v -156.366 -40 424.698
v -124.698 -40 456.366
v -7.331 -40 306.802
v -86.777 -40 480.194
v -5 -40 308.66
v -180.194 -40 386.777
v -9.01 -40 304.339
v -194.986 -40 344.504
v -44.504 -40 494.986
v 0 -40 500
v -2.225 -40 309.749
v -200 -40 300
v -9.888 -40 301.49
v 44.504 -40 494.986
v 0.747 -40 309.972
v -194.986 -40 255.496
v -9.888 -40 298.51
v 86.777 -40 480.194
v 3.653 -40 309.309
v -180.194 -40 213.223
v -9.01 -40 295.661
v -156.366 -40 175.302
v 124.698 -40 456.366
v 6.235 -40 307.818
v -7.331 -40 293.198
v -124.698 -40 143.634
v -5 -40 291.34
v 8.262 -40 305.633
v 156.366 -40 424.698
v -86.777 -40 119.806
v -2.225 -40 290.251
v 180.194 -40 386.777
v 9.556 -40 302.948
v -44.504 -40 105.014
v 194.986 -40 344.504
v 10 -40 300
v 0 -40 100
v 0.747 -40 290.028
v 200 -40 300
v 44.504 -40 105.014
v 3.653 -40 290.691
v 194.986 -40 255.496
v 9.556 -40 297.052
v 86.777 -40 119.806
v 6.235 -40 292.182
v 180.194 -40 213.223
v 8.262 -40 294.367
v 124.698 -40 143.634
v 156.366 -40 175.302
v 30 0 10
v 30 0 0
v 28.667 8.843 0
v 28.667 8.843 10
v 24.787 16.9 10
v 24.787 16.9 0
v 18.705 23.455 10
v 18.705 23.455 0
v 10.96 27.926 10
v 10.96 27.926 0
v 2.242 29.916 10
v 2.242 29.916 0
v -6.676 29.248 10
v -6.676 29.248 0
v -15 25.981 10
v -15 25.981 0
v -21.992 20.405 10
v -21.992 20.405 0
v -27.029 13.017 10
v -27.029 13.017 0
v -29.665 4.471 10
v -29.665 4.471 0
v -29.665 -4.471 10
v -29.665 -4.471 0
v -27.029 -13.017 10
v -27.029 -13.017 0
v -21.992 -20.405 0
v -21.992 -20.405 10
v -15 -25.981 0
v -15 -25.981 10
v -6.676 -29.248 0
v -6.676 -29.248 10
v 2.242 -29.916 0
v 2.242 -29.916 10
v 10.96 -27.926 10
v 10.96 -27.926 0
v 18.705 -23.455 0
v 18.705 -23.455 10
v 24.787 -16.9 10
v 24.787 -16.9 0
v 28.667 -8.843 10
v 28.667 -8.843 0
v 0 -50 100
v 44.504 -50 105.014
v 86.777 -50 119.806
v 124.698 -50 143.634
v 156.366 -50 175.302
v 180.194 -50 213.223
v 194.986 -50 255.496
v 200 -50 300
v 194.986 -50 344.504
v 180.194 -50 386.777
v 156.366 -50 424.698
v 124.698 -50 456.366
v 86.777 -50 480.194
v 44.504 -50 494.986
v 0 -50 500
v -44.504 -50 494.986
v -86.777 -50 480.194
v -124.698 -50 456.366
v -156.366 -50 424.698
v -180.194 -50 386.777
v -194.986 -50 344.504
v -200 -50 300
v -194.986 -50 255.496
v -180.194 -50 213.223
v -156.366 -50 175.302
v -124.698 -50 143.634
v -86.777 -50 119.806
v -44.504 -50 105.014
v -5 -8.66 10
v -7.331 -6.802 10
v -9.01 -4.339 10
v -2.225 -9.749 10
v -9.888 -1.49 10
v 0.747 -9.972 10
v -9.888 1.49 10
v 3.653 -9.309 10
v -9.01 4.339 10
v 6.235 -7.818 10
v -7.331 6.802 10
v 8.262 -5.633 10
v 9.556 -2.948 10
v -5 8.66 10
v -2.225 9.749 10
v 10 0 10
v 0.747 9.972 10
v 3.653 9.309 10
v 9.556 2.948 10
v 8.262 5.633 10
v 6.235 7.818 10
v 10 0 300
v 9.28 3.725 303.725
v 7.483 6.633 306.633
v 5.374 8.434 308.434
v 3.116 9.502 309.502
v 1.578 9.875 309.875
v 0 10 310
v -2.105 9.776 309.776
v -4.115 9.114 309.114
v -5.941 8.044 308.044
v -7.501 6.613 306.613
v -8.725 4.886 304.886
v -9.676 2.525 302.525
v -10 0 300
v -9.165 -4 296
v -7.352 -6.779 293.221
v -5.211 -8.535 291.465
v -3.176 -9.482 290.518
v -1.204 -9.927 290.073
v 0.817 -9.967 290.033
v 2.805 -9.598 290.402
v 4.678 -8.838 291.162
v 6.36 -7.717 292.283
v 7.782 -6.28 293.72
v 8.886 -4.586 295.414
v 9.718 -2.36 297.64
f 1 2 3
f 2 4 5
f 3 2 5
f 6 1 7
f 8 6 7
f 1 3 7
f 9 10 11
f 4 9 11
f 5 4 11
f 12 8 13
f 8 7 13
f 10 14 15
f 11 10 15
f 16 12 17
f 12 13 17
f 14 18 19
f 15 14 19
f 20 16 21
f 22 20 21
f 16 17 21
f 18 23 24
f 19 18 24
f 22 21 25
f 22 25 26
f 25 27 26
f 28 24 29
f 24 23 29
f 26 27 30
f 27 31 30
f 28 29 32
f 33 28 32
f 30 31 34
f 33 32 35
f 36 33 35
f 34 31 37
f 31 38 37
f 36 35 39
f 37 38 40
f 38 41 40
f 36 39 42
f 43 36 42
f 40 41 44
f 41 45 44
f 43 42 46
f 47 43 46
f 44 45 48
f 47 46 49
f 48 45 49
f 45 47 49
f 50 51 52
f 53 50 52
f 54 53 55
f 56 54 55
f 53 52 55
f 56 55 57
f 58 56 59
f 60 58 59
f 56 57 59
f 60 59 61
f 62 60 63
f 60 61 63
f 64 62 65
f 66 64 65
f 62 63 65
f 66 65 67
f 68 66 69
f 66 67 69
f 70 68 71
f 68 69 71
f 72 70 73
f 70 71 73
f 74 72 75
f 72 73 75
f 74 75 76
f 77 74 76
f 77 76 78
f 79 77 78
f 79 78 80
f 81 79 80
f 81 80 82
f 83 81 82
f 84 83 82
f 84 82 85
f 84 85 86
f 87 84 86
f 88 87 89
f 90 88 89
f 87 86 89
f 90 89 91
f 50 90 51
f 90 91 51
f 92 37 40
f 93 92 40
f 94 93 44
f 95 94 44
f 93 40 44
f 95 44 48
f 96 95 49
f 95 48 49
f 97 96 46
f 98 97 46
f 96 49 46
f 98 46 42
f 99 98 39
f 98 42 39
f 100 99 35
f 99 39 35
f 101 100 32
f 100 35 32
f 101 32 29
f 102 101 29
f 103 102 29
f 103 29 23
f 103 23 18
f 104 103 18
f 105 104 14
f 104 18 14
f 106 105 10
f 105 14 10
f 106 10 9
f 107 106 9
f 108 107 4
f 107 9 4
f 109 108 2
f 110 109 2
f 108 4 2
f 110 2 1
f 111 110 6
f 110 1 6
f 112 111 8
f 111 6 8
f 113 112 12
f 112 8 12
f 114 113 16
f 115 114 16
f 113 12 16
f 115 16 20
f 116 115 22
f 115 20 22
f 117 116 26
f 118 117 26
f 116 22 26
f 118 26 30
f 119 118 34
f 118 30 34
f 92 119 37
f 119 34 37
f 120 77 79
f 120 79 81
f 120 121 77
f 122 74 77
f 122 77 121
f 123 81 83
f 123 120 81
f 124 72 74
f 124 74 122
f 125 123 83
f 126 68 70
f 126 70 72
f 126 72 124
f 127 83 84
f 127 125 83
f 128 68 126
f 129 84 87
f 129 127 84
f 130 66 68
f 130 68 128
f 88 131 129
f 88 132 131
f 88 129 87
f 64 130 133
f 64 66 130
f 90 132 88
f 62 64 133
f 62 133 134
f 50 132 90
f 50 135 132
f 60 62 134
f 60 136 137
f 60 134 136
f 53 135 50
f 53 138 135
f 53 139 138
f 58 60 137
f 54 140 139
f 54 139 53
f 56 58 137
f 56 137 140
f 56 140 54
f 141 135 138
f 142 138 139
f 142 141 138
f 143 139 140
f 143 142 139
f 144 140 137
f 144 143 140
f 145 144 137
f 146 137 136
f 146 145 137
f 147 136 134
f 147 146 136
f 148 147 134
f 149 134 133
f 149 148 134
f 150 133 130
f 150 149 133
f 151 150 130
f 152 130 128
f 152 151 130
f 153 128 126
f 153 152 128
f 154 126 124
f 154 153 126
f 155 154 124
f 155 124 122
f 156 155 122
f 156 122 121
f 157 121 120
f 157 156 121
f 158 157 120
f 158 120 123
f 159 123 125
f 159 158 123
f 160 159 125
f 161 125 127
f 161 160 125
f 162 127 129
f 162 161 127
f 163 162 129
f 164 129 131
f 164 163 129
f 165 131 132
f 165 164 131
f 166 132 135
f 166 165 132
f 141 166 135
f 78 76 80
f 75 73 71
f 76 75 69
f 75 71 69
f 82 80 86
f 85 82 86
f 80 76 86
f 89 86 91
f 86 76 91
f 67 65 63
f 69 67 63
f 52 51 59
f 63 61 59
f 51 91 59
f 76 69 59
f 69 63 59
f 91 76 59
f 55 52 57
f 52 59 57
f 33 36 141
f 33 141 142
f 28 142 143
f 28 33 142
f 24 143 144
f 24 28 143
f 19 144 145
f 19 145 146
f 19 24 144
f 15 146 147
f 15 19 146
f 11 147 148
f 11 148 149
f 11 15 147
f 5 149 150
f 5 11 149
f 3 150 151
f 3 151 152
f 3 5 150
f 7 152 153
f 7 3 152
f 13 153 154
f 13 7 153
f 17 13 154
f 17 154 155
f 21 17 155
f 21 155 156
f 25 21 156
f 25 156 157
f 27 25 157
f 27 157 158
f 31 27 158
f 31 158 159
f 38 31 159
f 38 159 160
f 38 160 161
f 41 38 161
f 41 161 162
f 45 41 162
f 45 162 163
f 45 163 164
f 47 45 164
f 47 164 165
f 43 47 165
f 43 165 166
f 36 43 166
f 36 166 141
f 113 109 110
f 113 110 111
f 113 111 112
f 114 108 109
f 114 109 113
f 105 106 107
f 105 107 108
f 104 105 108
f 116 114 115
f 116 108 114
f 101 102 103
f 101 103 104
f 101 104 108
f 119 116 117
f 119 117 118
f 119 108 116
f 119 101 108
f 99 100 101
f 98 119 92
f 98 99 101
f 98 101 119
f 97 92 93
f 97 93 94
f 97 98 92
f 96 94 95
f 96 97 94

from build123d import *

# Parameters (mm, degrees)
SKETCH_1_R        = 30
EXTRUDE_1_DEPTH   = 10
SWEEP_1_PROFILE_R = 10
SKETCH_7_R        = 200
EXTRUDE_2_DEPTH   = 10


with BuildPart() as part:
    # Эскиз1 → Бобышка-Вытянуть1 (new body)
    with BuildSketch(Plane.XY):
        Circle(SKETCH_1_R)
    extrude(amount=EXTRUDE_1_DEPTH)

    # По траектории1: sweep along a curve in space
    with BuildLine() as sweep_1_path:
        Line((0, 0, 0), (0, 0, 300))
        Line((0, 0, 300), (0, -40, 300))
    # По траектории1 profile (on start of the path) → По траектории1 (sweep)
    with BuildSketch(Plane.XY):
        Circle(SWEEP_1_PROFILE_R)
    sweep(path=sweep_1_path.line, transition=Transition.RIGHT)

    # Эскиз7 → Бобышка-Вытянуть2 (add)
    with BuildSketch(Plane(origin=(0, -40, 0), x_dir=(-1, 0, 0), z_dir=(0, -1, 0))):
        with Locations(Location((0, -300, 0), (0, 0, 90))):
            Circle(SKETCH_7_R)
    extrude(amount=EXTRUDE_2_DEPTH)


solid = part.part
